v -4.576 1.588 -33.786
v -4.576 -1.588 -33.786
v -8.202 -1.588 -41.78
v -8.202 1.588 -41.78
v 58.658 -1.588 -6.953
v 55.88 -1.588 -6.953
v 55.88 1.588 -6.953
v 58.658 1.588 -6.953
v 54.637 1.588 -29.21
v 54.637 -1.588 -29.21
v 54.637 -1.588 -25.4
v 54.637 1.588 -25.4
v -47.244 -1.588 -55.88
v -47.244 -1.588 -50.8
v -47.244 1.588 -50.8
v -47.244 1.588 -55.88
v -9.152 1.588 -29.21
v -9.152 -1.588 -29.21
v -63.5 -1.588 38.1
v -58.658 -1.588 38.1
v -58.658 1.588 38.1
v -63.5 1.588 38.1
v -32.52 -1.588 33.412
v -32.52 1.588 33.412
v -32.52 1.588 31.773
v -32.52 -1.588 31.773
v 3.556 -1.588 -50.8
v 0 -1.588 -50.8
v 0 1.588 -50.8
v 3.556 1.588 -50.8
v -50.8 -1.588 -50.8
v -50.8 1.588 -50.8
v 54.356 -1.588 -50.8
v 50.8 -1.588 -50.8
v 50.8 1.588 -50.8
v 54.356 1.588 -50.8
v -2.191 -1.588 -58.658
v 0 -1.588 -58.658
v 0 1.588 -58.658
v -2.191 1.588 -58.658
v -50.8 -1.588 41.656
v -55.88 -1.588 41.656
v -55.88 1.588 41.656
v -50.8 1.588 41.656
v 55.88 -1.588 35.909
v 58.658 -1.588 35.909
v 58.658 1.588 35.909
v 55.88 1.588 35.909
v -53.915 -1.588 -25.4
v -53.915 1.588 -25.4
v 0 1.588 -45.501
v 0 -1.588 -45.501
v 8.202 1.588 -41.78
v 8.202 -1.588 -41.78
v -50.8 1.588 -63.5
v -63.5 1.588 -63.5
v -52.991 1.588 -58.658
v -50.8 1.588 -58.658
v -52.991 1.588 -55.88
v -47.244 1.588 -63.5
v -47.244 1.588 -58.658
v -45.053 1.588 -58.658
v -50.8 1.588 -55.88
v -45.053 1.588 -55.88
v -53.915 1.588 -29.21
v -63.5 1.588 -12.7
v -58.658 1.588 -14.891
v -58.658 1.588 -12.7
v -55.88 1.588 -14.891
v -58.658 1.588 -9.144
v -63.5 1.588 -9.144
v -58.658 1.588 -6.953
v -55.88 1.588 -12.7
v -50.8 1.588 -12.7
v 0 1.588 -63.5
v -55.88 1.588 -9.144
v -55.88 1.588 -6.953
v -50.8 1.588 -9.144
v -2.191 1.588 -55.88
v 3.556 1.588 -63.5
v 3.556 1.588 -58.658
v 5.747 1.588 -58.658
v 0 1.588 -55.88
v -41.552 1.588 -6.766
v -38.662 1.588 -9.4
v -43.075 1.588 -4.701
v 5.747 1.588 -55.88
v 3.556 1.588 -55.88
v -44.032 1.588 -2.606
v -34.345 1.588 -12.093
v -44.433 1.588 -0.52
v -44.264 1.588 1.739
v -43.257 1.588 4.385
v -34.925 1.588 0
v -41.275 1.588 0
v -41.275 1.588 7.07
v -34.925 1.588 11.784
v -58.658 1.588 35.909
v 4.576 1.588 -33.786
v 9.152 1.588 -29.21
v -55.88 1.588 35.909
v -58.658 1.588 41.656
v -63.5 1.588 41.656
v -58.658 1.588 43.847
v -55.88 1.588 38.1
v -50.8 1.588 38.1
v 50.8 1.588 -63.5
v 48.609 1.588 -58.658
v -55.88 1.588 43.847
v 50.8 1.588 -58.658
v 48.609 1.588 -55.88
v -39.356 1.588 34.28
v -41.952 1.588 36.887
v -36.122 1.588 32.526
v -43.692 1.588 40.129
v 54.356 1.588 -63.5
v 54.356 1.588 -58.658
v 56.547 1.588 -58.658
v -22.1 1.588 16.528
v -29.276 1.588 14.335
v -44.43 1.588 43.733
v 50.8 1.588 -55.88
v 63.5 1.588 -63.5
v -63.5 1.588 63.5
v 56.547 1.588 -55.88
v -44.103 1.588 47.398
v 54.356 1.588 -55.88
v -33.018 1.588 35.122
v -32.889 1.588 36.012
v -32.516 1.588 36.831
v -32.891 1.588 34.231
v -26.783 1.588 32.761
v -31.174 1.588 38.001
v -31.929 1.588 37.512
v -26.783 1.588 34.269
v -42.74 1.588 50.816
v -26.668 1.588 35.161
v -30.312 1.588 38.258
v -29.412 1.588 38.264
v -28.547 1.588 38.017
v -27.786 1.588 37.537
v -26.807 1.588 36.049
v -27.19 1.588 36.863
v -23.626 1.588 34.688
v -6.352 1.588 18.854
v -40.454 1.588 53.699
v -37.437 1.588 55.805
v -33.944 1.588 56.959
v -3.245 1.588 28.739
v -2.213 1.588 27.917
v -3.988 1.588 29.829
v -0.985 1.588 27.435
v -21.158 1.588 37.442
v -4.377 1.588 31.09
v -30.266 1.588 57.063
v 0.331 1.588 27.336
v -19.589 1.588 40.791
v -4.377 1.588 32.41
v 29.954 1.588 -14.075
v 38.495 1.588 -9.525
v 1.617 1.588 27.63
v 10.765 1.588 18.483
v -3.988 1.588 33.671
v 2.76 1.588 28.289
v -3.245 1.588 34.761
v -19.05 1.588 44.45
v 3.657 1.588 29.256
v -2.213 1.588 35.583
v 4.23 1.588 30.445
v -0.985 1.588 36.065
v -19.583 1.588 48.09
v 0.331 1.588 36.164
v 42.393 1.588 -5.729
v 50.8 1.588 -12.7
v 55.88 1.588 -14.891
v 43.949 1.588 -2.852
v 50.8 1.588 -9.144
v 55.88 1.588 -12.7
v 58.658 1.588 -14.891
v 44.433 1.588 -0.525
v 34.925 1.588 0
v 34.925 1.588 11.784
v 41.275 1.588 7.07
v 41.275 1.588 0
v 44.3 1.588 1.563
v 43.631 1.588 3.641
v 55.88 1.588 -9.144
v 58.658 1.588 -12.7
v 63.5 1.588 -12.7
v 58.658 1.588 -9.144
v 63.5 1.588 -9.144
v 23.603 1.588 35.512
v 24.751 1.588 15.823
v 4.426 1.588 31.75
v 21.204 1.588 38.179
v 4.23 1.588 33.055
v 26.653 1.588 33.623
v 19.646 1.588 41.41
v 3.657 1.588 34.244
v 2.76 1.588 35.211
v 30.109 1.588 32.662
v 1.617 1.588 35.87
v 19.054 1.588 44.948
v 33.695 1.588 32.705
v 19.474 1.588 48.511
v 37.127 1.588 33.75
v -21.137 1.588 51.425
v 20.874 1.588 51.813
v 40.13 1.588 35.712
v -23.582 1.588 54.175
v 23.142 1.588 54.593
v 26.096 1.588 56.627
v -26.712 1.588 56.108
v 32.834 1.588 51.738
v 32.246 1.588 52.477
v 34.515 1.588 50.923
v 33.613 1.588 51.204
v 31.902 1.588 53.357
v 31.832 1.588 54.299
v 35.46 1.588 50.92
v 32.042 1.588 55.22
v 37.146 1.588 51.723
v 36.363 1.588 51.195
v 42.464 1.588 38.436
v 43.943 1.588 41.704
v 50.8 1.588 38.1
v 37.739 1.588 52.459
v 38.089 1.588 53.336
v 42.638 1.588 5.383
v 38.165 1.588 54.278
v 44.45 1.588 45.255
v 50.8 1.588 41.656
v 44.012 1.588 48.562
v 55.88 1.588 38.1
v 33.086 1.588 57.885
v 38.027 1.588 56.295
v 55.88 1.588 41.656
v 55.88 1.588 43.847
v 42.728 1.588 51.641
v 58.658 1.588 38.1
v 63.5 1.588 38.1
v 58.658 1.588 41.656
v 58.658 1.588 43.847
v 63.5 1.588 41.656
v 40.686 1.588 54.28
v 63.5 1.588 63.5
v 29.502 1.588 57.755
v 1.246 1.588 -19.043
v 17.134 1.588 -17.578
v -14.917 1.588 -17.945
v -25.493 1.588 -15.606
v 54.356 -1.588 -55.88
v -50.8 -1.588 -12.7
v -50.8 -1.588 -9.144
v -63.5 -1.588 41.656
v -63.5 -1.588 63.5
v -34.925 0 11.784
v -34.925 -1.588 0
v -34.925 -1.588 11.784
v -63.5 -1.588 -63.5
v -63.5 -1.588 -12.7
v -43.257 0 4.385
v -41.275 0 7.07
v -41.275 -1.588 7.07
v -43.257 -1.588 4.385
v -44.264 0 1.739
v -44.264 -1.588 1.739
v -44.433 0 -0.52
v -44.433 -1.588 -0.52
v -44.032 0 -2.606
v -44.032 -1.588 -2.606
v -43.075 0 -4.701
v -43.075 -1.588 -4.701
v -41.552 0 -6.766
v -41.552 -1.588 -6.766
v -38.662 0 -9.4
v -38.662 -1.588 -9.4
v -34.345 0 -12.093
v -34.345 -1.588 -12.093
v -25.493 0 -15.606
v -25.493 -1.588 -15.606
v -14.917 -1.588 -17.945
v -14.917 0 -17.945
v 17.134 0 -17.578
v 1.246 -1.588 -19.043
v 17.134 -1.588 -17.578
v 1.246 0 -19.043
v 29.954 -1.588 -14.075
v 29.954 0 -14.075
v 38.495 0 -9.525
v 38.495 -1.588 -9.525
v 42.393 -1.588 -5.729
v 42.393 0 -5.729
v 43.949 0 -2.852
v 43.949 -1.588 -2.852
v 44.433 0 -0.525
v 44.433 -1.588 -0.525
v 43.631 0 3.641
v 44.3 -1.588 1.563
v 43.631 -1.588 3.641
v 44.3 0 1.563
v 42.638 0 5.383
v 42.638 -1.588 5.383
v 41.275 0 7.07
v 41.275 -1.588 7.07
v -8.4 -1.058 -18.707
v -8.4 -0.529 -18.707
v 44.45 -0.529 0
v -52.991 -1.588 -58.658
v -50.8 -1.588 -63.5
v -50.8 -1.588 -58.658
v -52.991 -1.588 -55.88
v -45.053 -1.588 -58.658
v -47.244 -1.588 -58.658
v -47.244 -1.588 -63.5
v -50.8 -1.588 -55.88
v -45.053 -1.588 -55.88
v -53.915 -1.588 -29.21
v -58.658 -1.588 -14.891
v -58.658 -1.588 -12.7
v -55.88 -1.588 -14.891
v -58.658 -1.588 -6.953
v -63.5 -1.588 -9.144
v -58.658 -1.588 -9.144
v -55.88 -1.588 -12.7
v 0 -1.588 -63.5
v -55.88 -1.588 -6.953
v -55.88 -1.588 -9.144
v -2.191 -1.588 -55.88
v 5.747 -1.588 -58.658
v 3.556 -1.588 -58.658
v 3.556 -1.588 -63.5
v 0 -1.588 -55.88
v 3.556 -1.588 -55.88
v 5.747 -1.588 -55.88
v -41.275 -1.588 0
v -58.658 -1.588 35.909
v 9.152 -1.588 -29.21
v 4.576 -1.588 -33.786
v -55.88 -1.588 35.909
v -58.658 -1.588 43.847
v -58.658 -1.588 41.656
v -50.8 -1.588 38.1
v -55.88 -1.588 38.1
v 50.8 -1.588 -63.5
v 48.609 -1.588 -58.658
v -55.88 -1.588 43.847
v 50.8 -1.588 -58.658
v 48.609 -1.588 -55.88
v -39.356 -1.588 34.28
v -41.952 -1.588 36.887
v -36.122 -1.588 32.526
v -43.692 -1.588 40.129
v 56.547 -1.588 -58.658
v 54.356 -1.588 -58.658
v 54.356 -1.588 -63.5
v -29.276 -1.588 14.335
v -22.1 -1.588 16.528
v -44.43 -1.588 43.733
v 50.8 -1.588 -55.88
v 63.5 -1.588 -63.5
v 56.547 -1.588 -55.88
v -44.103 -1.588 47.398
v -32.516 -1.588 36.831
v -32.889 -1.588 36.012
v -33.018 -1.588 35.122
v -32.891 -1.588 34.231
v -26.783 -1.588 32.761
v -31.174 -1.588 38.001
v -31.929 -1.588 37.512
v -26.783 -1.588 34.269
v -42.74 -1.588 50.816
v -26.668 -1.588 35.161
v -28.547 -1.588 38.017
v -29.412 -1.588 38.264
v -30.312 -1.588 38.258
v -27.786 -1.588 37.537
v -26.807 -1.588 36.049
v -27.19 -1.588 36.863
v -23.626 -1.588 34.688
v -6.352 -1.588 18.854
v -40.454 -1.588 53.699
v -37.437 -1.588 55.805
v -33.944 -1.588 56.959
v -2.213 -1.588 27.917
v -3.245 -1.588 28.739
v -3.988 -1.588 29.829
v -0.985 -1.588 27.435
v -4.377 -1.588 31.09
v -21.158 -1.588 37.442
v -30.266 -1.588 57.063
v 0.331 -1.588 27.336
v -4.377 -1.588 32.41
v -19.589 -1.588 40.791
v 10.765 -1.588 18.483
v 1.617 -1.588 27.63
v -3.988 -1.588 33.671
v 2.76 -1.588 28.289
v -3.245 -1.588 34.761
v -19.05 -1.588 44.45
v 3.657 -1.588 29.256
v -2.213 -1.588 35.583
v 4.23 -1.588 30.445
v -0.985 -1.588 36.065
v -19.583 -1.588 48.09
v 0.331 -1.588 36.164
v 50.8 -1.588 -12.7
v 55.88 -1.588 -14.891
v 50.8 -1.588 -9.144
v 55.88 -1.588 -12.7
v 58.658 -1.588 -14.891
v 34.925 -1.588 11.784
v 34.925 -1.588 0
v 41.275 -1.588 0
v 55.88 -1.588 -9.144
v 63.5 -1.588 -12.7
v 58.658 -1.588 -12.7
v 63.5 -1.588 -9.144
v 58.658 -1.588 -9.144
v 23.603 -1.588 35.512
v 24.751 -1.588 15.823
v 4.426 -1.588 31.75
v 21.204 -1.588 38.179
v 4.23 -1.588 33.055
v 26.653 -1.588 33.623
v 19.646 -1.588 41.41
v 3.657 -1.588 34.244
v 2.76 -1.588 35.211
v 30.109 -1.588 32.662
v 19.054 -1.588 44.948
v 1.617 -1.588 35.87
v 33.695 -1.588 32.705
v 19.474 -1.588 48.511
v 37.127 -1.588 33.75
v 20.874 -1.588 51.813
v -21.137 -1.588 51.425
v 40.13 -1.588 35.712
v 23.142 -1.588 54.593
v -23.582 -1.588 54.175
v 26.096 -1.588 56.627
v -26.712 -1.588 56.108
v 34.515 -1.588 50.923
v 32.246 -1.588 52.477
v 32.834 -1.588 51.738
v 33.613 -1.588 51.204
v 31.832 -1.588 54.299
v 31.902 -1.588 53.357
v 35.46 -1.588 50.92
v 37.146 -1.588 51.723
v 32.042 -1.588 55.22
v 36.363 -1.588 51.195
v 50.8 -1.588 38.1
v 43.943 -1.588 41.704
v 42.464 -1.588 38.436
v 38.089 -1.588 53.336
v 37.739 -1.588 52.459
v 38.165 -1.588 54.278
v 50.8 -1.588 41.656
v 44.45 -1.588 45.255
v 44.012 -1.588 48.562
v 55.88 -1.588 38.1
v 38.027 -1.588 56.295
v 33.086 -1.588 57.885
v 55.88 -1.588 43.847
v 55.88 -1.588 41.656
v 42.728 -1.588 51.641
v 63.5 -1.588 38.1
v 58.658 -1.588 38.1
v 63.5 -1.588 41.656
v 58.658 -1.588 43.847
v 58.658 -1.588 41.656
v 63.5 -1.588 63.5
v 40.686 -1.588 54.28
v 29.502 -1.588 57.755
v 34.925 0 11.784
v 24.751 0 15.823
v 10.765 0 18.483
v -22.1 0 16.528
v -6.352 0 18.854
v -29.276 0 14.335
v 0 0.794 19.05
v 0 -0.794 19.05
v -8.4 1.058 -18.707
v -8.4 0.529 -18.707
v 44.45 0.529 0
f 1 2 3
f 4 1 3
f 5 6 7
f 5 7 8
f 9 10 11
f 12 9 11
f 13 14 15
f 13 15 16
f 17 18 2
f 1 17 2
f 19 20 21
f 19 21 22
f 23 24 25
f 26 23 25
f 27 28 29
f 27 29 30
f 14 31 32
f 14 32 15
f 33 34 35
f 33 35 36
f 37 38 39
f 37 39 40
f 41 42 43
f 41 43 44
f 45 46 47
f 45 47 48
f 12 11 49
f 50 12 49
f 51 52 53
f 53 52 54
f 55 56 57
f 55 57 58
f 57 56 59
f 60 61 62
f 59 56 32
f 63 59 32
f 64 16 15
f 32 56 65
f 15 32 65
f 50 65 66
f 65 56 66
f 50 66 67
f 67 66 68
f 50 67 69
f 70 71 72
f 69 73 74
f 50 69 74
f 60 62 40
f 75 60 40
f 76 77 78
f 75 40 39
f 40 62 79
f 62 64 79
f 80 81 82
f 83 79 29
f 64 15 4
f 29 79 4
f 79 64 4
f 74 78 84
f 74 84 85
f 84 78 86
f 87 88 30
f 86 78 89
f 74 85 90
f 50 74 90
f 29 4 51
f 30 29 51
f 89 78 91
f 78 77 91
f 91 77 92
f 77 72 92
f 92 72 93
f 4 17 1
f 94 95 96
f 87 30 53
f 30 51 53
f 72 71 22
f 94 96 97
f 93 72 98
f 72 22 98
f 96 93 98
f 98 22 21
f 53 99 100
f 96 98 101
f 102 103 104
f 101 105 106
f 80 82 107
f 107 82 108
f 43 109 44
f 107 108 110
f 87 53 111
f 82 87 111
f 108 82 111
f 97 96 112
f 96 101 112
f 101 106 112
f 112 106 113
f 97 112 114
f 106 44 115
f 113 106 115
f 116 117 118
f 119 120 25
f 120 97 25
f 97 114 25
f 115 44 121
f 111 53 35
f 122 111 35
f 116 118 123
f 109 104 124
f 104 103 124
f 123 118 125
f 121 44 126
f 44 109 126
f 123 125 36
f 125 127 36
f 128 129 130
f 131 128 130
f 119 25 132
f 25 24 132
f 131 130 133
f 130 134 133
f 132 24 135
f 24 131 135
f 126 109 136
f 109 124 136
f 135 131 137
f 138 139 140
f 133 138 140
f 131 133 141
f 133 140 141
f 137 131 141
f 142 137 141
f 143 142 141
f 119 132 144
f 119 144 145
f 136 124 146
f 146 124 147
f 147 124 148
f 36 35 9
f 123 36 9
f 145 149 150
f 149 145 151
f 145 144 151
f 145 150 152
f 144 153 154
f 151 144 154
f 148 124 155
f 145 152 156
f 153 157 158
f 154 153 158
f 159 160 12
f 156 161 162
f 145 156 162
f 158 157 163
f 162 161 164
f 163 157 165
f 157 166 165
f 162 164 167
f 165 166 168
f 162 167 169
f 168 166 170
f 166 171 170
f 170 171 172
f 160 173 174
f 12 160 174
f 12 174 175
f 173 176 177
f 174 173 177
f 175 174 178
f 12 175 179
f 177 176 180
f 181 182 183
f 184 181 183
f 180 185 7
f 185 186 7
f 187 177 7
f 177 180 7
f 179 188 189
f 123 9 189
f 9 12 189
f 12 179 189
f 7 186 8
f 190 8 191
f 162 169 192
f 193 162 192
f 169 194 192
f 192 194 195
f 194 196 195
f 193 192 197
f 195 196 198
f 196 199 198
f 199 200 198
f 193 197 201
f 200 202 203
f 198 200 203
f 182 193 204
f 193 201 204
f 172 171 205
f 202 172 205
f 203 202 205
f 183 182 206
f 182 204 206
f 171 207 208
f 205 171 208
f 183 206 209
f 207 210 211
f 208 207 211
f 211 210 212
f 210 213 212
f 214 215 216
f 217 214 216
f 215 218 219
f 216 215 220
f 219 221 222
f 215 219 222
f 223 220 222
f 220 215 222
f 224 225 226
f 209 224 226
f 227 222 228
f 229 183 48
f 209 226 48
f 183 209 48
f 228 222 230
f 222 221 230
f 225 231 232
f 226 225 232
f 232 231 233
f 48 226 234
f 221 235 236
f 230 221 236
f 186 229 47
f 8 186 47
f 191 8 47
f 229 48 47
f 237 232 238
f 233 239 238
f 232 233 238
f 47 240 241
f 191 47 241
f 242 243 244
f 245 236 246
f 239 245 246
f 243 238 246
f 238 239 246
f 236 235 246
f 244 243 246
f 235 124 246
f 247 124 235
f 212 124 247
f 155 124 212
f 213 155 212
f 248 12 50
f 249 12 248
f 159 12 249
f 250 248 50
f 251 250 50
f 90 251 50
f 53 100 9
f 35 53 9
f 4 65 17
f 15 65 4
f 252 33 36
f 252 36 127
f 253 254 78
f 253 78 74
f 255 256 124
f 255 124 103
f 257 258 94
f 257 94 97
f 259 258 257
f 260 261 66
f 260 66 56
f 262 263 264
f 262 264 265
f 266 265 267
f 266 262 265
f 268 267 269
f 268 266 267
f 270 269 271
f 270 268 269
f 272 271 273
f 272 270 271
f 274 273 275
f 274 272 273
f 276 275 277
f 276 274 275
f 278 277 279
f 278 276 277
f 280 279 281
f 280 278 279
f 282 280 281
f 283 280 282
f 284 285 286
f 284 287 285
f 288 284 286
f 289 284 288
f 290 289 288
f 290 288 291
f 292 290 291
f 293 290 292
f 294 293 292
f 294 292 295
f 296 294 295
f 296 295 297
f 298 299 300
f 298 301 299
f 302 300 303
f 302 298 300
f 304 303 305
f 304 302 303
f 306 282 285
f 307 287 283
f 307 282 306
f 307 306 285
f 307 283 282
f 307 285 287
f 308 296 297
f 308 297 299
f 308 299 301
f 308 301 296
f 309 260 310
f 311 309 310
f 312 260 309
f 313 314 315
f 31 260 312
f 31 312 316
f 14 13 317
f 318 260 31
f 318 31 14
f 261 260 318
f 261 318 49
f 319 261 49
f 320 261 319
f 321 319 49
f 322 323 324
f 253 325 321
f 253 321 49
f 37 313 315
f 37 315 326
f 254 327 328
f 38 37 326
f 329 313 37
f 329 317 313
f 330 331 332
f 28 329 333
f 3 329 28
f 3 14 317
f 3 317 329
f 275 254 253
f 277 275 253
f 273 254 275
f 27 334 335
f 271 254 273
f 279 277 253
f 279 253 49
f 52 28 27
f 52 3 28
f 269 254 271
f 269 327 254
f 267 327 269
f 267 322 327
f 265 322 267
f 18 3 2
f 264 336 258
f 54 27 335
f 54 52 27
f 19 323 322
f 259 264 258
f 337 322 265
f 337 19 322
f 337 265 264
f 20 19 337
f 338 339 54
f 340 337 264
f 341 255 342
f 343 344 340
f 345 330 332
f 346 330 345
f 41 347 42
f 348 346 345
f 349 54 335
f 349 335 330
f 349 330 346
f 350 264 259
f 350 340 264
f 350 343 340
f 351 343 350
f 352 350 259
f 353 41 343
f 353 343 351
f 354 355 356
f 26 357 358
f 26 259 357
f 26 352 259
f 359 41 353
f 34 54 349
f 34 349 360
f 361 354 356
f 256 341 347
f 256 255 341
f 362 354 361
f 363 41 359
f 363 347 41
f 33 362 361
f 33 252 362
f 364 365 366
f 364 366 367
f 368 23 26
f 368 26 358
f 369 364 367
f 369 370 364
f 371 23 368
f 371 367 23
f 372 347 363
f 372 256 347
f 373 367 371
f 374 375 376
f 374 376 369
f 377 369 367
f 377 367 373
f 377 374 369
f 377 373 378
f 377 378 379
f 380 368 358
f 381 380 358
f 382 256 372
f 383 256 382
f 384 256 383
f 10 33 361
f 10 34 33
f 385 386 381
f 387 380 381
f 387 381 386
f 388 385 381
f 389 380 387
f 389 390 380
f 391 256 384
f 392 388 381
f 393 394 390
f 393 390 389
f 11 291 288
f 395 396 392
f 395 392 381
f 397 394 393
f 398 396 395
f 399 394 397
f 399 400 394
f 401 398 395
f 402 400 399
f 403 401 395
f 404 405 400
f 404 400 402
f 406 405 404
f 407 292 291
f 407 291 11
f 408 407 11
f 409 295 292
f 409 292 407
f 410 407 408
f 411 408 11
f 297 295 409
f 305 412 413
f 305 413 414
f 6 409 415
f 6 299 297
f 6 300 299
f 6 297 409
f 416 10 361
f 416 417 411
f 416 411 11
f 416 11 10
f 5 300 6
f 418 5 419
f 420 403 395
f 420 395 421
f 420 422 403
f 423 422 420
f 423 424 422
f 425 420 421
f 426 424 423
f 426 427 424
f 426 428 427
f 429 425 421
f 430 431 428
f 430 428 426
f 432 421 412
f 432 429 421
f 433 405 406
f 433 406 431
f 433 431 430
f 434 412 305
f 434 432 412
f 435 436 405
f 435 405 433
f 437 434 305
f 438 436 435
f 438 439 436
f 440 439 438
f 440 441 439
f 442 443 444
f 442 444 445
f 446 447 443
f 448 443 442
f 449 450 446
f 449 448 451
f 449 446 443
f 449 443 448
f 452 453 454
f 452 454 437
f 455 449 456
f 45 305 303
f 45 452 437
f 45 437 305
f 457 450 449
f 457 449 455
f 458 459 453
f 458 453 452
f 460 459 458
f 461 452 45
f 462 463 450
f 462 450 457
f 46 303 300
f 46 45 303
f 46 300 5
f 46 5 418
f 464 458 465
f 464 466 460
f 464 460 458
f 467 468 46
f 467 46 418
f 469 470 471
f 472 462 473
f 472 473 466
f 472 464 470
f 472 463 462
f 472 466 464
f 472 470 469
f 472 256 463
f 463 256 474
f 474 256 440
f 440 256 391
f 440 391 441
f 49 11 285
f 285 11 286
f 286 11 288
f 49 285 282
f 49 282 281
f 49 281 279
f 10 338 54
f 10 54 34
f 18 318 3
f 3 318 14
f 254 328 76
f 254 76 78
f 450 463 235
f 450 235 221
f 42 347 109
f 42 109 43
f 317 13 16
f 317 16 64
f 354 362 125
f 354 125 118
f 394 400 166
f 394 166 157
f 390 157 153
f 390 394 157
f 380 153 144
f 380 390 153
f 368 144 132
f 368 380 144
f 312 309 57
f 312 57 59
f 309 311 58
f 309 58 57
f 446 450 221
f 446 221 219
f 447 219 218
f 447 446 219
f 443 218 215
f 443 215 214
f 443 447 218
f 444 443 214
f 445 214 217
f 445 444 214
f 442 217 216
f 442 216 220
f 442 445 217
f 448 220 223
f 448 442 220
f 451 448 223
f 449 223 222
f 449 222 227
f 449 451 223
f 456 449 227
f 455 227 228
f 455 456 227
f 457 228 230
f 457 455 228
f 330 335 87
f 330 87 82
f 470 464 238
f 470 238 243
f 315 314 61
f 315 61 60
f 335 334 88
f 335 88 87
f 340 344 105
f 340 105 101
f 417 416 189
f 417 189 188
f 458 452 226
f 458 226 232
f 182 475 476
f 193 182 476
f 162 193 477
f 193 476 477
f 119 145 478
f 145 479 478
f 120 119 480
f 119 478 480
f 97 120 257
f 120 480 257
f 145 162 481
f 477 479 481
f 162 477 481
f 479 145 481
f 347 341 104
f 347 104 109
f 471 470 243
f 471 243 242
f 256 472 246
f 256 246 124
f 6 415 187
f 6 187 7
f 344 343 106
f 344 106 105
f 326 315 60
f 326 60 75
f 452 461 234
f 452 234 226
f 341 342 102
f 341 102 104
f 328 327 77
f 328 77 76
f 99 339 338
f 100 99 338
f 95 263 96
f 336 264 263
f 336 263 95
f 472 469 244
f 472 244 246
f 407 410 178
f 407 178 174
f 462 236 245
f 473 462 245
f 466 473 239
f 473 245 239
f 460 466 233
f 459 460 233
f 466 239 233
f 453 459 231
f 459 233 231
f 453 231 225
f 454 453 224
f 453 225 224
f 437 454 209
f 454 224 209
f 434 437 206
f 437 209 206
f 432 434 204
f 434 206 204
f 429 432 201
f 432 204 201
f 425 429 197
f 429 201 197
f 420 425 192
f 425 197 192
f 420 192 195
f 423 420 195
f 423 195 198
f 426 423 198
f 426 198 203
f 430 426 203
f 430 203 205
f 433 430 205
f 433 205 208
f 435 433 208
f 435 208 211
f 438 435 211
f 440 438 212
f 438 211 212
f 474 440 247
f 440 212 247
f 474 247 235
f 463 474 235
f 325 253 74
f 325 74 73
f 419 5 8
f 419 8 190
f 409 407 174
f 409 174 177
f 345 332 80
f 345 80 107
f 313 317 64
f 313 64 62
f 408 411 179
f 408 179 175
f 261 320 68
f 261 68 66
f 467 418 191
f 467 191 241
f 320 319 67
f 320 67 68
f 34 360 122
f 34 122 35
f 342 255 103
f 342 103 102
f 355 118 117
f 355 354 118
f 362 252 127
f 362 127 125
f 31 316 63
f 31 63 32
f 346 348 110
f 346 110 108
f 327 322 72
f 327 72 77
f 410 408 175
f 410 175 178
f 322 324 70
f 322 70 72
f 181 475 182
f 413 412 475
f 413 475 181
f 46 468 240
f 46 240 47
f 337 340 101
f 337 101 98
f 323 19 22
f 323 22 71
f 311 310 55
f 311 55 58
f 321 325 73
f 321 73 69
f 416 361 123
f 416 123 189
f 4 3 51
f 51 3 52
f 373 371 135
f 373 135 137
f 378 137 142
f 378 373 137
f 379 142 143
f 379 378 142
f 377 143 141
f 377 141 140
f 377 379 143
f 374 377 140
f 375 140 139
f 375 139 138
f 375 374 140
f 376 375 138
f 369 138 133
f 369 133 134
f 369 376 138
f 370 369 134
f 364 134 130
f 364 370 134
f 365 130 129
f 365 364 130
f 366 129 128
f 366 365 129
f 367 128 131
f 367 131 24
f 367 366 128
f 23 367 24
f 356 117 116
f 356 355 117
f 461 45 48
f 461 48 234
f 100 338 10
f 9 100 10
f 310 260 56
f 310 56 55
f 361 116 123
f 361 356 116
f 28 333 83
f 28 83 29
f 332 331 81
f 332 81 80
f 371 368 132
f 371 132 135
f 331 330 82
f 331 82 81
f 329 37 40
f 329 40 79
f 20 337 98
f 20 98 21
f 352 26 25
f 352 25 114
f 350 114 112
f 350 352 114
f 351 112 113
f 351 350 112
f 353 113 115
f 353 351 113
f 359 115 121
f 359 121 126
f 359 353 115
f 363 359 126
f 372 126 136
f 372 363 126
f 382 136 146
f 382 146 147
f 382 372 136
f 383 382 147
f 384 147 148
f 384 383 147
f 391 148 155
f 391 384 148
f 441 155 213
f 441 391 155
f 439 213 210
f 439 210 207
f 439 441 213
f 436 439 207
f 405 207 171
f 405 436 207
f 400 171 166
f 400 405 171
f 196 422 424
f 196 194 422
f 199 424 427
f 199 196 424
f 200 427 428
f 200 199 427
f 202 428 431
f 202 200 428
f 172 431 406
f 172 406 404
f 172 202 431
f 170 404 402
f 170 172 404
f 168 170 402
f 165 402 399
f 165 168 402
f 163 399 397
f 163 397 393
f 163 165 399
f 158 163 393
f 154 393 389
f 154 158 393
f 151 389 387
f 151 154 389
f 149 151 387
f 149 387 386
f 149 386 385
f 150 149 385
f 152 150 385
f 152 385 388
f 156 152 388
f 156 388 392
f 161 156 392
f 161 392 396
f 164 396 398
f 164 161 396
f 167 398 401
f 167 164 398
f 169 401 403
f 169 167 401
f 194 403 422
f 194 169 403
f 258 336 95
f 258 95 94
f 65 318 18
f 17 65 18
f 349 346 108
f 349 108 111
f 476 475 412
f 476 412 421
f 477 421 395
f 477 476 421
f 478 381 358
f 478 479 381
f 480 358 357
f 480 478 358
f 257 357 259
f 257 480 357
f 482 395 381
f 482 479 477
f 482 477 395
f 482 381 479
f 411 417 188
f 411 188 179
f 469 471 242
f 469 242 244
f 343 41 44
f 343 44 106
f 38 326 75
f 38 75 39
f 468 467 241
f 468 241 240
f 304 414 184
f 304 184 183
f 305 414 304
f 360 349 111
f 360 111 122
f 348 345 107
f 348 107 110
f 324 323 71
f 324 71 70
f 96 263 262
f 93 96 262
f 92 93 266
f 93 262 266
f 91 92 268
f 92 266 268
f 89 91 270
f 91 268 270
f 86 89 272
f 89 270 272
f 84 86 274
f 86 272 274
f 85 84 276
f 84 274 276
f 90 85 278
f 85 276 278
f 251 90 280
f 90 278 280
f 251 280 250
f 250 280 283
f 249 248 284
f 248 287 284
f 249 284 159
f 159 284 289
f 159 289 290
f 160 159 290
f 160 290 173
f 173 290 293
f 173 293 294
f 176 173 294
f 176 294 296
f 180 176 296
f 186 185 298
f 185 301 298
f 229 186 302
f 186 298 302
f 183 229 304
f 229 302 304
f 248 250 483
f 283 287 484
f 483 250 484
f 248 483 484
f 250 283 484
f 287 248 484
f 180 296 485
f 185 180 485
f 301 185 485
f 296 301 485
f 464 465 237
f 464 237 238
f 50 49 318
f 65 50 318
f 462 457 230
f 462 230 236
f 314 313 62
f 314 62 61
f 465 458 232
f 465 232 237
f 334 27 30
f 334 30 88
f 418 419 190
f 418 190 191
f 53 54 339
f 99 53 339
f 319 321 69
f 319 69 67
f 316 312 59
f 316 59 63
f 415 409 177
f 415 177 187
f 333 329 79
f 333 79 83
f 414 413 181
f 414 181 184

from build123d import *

# Parameters (mm, degrees)
F0_R     = 4.426475661
F1_DEPTH = 1.5875
F3_DEPTH = 3.1760001


with BuildPart() as f1:
    # F0 (on Front) → F1 (new body, symmetric)
    with BuildSketch(Plane.XZ):
        Polygon((54.356, -63.5), (63.5, -63.5), (63.5, -12.7), (58.658125, -12.7), (58.658125, -14.89075), (55.88, -14.89075), (55.88, -12.7), (50.8, -12.7), (50.8, -9.144), (55.88, -9.144), (55.88, -6.95325), (58.658125, -6.95325), (58.658125, -9.144), (63.5, -9.144), (63.5, 38.1), (58.658125, 38.1), (58.658125, 35.90925), (55.88, 35.90925), (55.88, 38.1), (50.8, 38.1), (50.8, 41.656), (55.88, 41.656), (55.88, 43.84675), (58.658125, 43.84675), (58.658125, 41.656), (63.5, 41.656), (63.5, 63.5), (-63.5, 63.5), (-63.5, 41.656), (-58.658125, 41.656), (-58.658125, 43.84675), (-55.88, 43.84675), (-55.88, 41.656), (-50.8, 41.656), (-50.8, 38.1), (-55.88, 38.1), (-55.88, 35.90925), (-58.658125, 35.90925), (-58.658125, 38.1), (-63.5, 38.1), (-63.5, -9.144), (-58.658125, -9.144), (-58.658125, -6.95325), (-55.88, -6.95325), (-55.88, -9.144), (-50.8, -9.144), (-50.8, -12.7), (-55.88, -12.7), (-55.88, -14.89075), (-58.658125, -14.89075), (-58.658125, -12.7), (-63.5, -12.7), (-63.5, -63.5), (-50.8, -63.5), (-50.8, -58.658125), (-52.99075, -58.658125), (-52.99075, -55.88), (-50.8, -55.88), (-50.8, -50.8), (-47.244, -50.8), (-47.244, -55.88), (-45.05325, -55.88), (-45.05325, -58.658125), (-47.244, -58.658125), (-47.244, -63.5), (0, -63.5), (0, -58.658125), (-2.19075, -58.658125), (-2.19075, -55.88), (0, -55.88), (0, -50.8), (3.556, -50.8), (3.556, -55.88), (5.74675, -55.88), (5.74675, -58.658125), (3.556, -58.658125), (3.556, -63.5), (50.8, -63.5), (50.8, -58.658125), (48.60925, -58.658125), (48.60925, -55.88), (50.8, -55.88), (50.8, -50.8), (54.356, -50.8), (54.356, -55.88), (56.54675, -55.88), (56.54675, -58.658125), (54.356, -58.658125), align=None)
        with BuildLine():
            ThreePointArc((-32.5203218701, 31.7733835659), (-40.4536461397, 53.6985968598), (-19.05, 44.45))
            ThreePointArc((-19.05, 44.45), (-21.1583387907, 37.4423818007), (-26.7833406026, 32.7614460077))
            ThreePointArc((-26.7833406026, 32.7614460077), (-29.5944538957, 31.9342650638), (-32.5203218701, 31.7733835659))
        make_face(mode=Mode.SUBTRACT)
        with BuildLine():
            add(Edge.make_bspline(
                [(44.45, 0), (44.45, 3.6661742094), (41.275, 7.0704788323)],
                knots=[0, 0, 0, 0.3802512067, 0.3802512067, 0.3802512067], degree=2, weights=[1, 0.9819805061, 1]))
            add(Edge.make_bspline(
                [(-41.275, 7.0704788323), (-61.2505208253, -14.3477126296), (-8.4002604126, -18.7067286405), (44.45, -23.0657446513), (44.45, 0)],
                knots=[2.7613414469, 2.7613414469, 2.7613414469, 4.522263377, 4.522263377, 6.2831853072, 6.2831853072, 6.2831853072], degree=2, weights=[1, 0.6367957928, 1, 0.6367957928, 1]))
            add(Edge.make_bspline(
                [(-34.925, 11.7841313872), (-38.89375, 9.6237072996), (-41.275, 7.0704788323)],
                knots=[2.4746463091, 2.4746463091, 2.4746463091, 2.7613414469, 2.7613414469, 2.7613414469], degree=2, weights=[1, 0.9897433186, 1]))
            add(Edge.make_bspline(
                [(34.925, 11.7841313872), (0, 30.7958633586), (-34.925, 11.7841313872)],
                knots=[0.6669463445, 0.6669463445, 0.6669463445, 2.4746463091, 2.4746463091, 2.4746463091], degree=2, weights=[1, 0.6185895741, 1]))
            add(Edge.make_bspline(
                [(41.275, 7.0704788323), (38.89375, 9.6237072996), (34.925, 11.7841313872)],
                knots=[0.3802512067, 0.3802512067, 0.3802512067, 0.6669463445, 0.6669463445, 0.6669463445], degree=2, weights=[1, 0.9897433186, 1]))
        make_face(mode=Mode.SUBTRACT)
        with Locations((0, 31.75)):
            Circle(F0_R, mode=Mode.SUBTRACT)
        with BuildLine():
            ThreePointArc((38.02746706, 56.2953220395), (42.727564203, 51.6414036807), (44.45, 45.2552401869))
            ThreePointArc((44.45, 45.2552401869), (22.3090487849, 36.7606277676), (33.0864661175, 57.8847238785))
            ThreePointArc((33.0864661175, 57.8847238785), (35.639028691, 57.3451308333), (38.02746706, 56.2953220395))
        make_face(mode=Mode.SUBTRACT)
        with BuildLine():
            Line((38.1654474814, 54.2776674622), (38.02746706, 56.2953220395))
            ThreePointArc((38.02746706, 56.2953220395), (35.639028691, 57.3451308333), (33.0864661175, 57.8847238785))
            Line((33.0864661175, 57.8847238785), (32.0418357229, 55.2197649229))
            ThreePointArc((32.0418357229, 55.2197649229), (34.5150625993, 50.9229662535), (38.1654474814, 54.2776674622))
        make_face()
        with BuildLine():
            Line((-32.5203218701, 33.4118034209), (-32.5203218701, 31.7733835659))
            ThreePointArc((-32.5203218701, 31.7733835659), (-29.5944538957, 31.9342650638), (-26.7833406026, 32.7614460077))
            Line((-26.7833406026, 32.7614460077), (-26.7833406026, 34.2687429437))
            ThreePointArc((-26.7833406026, 34.2687429437), (-30.3117243032, 38.2580810463), (-32.5203218701, 33.4118034209))
        make_face()
        with BuildLine():
            add(Edge.make_bspline(
                [(-34.925, 11.7841313872), (-38.89375, 9.6237072996), (-41.275, 7.0704788323)],
                knots=[2.4746463091, 2.4746463091, 2.4746463091, 2.7613414469, 2.7613414469, 2.7613414469], degree=2, weights=[1, 0.9897433186, 1]))
            Line((-41.275, 7.0704788323), (-41.275, 0))
            Line((-41.275, 0), (-34.925, 0))
            Line((-34.925, 0), (-34.925, 11.7841313872))
        make_face()
        with BuildLine():
            Line((41.275, 0), (41.275, 7.0704788323))
            add(Edge.make_bspline(
                [(41.275, 7.0704788323), (38.89375, 9.6237072996), (34.925, 11.7841313872)],
                knots=[0.3802512067, 0.3802512067, 0.3802512067, 0.6669463445, 0.6669463445, 0.6669463445], degree=2, weights=[1, 0.9897433186, 1]))
            Line((34.925, 11.7841313872), (34.925, 0))
            Line((34.925, 0), (41.275, 0))
        make_face()
    extrude(amount=F1_DEPTH, both=True)

    # F2 (on face) → F3 (cut, through all)
    with BuildSketch(Plane.XZ.offset(1.5875)):
        Polygon((-53.9152510464, -25.4), (-53.9152510464, -29.21), (-9.1524110914, -29.21), (9.1524110914, -29.21), (54.6370558441, -29.21), (54.6370558441, -25.4), align=None)
        Polygon((9.1524110914, -29.21), (-9.1524110914, -29.21), (-4.5762055457, -33.7862055457), (0, -38.3624110914), (4.5762055457, -33.7862055457), align=None)
        Polygon((0, -38.3624110914), (-4.5762055457, -33.7862055457), (-8.2022583859, -41.7798972868), (0, -45.5005589385), (8.2022583859, -41.7798972868), (4.5762055457, -33.7862055457), align=None)
    extrude(amount=-F3_DEPTH, mode=Mode.SUBTRACT)


solid = f1.part
